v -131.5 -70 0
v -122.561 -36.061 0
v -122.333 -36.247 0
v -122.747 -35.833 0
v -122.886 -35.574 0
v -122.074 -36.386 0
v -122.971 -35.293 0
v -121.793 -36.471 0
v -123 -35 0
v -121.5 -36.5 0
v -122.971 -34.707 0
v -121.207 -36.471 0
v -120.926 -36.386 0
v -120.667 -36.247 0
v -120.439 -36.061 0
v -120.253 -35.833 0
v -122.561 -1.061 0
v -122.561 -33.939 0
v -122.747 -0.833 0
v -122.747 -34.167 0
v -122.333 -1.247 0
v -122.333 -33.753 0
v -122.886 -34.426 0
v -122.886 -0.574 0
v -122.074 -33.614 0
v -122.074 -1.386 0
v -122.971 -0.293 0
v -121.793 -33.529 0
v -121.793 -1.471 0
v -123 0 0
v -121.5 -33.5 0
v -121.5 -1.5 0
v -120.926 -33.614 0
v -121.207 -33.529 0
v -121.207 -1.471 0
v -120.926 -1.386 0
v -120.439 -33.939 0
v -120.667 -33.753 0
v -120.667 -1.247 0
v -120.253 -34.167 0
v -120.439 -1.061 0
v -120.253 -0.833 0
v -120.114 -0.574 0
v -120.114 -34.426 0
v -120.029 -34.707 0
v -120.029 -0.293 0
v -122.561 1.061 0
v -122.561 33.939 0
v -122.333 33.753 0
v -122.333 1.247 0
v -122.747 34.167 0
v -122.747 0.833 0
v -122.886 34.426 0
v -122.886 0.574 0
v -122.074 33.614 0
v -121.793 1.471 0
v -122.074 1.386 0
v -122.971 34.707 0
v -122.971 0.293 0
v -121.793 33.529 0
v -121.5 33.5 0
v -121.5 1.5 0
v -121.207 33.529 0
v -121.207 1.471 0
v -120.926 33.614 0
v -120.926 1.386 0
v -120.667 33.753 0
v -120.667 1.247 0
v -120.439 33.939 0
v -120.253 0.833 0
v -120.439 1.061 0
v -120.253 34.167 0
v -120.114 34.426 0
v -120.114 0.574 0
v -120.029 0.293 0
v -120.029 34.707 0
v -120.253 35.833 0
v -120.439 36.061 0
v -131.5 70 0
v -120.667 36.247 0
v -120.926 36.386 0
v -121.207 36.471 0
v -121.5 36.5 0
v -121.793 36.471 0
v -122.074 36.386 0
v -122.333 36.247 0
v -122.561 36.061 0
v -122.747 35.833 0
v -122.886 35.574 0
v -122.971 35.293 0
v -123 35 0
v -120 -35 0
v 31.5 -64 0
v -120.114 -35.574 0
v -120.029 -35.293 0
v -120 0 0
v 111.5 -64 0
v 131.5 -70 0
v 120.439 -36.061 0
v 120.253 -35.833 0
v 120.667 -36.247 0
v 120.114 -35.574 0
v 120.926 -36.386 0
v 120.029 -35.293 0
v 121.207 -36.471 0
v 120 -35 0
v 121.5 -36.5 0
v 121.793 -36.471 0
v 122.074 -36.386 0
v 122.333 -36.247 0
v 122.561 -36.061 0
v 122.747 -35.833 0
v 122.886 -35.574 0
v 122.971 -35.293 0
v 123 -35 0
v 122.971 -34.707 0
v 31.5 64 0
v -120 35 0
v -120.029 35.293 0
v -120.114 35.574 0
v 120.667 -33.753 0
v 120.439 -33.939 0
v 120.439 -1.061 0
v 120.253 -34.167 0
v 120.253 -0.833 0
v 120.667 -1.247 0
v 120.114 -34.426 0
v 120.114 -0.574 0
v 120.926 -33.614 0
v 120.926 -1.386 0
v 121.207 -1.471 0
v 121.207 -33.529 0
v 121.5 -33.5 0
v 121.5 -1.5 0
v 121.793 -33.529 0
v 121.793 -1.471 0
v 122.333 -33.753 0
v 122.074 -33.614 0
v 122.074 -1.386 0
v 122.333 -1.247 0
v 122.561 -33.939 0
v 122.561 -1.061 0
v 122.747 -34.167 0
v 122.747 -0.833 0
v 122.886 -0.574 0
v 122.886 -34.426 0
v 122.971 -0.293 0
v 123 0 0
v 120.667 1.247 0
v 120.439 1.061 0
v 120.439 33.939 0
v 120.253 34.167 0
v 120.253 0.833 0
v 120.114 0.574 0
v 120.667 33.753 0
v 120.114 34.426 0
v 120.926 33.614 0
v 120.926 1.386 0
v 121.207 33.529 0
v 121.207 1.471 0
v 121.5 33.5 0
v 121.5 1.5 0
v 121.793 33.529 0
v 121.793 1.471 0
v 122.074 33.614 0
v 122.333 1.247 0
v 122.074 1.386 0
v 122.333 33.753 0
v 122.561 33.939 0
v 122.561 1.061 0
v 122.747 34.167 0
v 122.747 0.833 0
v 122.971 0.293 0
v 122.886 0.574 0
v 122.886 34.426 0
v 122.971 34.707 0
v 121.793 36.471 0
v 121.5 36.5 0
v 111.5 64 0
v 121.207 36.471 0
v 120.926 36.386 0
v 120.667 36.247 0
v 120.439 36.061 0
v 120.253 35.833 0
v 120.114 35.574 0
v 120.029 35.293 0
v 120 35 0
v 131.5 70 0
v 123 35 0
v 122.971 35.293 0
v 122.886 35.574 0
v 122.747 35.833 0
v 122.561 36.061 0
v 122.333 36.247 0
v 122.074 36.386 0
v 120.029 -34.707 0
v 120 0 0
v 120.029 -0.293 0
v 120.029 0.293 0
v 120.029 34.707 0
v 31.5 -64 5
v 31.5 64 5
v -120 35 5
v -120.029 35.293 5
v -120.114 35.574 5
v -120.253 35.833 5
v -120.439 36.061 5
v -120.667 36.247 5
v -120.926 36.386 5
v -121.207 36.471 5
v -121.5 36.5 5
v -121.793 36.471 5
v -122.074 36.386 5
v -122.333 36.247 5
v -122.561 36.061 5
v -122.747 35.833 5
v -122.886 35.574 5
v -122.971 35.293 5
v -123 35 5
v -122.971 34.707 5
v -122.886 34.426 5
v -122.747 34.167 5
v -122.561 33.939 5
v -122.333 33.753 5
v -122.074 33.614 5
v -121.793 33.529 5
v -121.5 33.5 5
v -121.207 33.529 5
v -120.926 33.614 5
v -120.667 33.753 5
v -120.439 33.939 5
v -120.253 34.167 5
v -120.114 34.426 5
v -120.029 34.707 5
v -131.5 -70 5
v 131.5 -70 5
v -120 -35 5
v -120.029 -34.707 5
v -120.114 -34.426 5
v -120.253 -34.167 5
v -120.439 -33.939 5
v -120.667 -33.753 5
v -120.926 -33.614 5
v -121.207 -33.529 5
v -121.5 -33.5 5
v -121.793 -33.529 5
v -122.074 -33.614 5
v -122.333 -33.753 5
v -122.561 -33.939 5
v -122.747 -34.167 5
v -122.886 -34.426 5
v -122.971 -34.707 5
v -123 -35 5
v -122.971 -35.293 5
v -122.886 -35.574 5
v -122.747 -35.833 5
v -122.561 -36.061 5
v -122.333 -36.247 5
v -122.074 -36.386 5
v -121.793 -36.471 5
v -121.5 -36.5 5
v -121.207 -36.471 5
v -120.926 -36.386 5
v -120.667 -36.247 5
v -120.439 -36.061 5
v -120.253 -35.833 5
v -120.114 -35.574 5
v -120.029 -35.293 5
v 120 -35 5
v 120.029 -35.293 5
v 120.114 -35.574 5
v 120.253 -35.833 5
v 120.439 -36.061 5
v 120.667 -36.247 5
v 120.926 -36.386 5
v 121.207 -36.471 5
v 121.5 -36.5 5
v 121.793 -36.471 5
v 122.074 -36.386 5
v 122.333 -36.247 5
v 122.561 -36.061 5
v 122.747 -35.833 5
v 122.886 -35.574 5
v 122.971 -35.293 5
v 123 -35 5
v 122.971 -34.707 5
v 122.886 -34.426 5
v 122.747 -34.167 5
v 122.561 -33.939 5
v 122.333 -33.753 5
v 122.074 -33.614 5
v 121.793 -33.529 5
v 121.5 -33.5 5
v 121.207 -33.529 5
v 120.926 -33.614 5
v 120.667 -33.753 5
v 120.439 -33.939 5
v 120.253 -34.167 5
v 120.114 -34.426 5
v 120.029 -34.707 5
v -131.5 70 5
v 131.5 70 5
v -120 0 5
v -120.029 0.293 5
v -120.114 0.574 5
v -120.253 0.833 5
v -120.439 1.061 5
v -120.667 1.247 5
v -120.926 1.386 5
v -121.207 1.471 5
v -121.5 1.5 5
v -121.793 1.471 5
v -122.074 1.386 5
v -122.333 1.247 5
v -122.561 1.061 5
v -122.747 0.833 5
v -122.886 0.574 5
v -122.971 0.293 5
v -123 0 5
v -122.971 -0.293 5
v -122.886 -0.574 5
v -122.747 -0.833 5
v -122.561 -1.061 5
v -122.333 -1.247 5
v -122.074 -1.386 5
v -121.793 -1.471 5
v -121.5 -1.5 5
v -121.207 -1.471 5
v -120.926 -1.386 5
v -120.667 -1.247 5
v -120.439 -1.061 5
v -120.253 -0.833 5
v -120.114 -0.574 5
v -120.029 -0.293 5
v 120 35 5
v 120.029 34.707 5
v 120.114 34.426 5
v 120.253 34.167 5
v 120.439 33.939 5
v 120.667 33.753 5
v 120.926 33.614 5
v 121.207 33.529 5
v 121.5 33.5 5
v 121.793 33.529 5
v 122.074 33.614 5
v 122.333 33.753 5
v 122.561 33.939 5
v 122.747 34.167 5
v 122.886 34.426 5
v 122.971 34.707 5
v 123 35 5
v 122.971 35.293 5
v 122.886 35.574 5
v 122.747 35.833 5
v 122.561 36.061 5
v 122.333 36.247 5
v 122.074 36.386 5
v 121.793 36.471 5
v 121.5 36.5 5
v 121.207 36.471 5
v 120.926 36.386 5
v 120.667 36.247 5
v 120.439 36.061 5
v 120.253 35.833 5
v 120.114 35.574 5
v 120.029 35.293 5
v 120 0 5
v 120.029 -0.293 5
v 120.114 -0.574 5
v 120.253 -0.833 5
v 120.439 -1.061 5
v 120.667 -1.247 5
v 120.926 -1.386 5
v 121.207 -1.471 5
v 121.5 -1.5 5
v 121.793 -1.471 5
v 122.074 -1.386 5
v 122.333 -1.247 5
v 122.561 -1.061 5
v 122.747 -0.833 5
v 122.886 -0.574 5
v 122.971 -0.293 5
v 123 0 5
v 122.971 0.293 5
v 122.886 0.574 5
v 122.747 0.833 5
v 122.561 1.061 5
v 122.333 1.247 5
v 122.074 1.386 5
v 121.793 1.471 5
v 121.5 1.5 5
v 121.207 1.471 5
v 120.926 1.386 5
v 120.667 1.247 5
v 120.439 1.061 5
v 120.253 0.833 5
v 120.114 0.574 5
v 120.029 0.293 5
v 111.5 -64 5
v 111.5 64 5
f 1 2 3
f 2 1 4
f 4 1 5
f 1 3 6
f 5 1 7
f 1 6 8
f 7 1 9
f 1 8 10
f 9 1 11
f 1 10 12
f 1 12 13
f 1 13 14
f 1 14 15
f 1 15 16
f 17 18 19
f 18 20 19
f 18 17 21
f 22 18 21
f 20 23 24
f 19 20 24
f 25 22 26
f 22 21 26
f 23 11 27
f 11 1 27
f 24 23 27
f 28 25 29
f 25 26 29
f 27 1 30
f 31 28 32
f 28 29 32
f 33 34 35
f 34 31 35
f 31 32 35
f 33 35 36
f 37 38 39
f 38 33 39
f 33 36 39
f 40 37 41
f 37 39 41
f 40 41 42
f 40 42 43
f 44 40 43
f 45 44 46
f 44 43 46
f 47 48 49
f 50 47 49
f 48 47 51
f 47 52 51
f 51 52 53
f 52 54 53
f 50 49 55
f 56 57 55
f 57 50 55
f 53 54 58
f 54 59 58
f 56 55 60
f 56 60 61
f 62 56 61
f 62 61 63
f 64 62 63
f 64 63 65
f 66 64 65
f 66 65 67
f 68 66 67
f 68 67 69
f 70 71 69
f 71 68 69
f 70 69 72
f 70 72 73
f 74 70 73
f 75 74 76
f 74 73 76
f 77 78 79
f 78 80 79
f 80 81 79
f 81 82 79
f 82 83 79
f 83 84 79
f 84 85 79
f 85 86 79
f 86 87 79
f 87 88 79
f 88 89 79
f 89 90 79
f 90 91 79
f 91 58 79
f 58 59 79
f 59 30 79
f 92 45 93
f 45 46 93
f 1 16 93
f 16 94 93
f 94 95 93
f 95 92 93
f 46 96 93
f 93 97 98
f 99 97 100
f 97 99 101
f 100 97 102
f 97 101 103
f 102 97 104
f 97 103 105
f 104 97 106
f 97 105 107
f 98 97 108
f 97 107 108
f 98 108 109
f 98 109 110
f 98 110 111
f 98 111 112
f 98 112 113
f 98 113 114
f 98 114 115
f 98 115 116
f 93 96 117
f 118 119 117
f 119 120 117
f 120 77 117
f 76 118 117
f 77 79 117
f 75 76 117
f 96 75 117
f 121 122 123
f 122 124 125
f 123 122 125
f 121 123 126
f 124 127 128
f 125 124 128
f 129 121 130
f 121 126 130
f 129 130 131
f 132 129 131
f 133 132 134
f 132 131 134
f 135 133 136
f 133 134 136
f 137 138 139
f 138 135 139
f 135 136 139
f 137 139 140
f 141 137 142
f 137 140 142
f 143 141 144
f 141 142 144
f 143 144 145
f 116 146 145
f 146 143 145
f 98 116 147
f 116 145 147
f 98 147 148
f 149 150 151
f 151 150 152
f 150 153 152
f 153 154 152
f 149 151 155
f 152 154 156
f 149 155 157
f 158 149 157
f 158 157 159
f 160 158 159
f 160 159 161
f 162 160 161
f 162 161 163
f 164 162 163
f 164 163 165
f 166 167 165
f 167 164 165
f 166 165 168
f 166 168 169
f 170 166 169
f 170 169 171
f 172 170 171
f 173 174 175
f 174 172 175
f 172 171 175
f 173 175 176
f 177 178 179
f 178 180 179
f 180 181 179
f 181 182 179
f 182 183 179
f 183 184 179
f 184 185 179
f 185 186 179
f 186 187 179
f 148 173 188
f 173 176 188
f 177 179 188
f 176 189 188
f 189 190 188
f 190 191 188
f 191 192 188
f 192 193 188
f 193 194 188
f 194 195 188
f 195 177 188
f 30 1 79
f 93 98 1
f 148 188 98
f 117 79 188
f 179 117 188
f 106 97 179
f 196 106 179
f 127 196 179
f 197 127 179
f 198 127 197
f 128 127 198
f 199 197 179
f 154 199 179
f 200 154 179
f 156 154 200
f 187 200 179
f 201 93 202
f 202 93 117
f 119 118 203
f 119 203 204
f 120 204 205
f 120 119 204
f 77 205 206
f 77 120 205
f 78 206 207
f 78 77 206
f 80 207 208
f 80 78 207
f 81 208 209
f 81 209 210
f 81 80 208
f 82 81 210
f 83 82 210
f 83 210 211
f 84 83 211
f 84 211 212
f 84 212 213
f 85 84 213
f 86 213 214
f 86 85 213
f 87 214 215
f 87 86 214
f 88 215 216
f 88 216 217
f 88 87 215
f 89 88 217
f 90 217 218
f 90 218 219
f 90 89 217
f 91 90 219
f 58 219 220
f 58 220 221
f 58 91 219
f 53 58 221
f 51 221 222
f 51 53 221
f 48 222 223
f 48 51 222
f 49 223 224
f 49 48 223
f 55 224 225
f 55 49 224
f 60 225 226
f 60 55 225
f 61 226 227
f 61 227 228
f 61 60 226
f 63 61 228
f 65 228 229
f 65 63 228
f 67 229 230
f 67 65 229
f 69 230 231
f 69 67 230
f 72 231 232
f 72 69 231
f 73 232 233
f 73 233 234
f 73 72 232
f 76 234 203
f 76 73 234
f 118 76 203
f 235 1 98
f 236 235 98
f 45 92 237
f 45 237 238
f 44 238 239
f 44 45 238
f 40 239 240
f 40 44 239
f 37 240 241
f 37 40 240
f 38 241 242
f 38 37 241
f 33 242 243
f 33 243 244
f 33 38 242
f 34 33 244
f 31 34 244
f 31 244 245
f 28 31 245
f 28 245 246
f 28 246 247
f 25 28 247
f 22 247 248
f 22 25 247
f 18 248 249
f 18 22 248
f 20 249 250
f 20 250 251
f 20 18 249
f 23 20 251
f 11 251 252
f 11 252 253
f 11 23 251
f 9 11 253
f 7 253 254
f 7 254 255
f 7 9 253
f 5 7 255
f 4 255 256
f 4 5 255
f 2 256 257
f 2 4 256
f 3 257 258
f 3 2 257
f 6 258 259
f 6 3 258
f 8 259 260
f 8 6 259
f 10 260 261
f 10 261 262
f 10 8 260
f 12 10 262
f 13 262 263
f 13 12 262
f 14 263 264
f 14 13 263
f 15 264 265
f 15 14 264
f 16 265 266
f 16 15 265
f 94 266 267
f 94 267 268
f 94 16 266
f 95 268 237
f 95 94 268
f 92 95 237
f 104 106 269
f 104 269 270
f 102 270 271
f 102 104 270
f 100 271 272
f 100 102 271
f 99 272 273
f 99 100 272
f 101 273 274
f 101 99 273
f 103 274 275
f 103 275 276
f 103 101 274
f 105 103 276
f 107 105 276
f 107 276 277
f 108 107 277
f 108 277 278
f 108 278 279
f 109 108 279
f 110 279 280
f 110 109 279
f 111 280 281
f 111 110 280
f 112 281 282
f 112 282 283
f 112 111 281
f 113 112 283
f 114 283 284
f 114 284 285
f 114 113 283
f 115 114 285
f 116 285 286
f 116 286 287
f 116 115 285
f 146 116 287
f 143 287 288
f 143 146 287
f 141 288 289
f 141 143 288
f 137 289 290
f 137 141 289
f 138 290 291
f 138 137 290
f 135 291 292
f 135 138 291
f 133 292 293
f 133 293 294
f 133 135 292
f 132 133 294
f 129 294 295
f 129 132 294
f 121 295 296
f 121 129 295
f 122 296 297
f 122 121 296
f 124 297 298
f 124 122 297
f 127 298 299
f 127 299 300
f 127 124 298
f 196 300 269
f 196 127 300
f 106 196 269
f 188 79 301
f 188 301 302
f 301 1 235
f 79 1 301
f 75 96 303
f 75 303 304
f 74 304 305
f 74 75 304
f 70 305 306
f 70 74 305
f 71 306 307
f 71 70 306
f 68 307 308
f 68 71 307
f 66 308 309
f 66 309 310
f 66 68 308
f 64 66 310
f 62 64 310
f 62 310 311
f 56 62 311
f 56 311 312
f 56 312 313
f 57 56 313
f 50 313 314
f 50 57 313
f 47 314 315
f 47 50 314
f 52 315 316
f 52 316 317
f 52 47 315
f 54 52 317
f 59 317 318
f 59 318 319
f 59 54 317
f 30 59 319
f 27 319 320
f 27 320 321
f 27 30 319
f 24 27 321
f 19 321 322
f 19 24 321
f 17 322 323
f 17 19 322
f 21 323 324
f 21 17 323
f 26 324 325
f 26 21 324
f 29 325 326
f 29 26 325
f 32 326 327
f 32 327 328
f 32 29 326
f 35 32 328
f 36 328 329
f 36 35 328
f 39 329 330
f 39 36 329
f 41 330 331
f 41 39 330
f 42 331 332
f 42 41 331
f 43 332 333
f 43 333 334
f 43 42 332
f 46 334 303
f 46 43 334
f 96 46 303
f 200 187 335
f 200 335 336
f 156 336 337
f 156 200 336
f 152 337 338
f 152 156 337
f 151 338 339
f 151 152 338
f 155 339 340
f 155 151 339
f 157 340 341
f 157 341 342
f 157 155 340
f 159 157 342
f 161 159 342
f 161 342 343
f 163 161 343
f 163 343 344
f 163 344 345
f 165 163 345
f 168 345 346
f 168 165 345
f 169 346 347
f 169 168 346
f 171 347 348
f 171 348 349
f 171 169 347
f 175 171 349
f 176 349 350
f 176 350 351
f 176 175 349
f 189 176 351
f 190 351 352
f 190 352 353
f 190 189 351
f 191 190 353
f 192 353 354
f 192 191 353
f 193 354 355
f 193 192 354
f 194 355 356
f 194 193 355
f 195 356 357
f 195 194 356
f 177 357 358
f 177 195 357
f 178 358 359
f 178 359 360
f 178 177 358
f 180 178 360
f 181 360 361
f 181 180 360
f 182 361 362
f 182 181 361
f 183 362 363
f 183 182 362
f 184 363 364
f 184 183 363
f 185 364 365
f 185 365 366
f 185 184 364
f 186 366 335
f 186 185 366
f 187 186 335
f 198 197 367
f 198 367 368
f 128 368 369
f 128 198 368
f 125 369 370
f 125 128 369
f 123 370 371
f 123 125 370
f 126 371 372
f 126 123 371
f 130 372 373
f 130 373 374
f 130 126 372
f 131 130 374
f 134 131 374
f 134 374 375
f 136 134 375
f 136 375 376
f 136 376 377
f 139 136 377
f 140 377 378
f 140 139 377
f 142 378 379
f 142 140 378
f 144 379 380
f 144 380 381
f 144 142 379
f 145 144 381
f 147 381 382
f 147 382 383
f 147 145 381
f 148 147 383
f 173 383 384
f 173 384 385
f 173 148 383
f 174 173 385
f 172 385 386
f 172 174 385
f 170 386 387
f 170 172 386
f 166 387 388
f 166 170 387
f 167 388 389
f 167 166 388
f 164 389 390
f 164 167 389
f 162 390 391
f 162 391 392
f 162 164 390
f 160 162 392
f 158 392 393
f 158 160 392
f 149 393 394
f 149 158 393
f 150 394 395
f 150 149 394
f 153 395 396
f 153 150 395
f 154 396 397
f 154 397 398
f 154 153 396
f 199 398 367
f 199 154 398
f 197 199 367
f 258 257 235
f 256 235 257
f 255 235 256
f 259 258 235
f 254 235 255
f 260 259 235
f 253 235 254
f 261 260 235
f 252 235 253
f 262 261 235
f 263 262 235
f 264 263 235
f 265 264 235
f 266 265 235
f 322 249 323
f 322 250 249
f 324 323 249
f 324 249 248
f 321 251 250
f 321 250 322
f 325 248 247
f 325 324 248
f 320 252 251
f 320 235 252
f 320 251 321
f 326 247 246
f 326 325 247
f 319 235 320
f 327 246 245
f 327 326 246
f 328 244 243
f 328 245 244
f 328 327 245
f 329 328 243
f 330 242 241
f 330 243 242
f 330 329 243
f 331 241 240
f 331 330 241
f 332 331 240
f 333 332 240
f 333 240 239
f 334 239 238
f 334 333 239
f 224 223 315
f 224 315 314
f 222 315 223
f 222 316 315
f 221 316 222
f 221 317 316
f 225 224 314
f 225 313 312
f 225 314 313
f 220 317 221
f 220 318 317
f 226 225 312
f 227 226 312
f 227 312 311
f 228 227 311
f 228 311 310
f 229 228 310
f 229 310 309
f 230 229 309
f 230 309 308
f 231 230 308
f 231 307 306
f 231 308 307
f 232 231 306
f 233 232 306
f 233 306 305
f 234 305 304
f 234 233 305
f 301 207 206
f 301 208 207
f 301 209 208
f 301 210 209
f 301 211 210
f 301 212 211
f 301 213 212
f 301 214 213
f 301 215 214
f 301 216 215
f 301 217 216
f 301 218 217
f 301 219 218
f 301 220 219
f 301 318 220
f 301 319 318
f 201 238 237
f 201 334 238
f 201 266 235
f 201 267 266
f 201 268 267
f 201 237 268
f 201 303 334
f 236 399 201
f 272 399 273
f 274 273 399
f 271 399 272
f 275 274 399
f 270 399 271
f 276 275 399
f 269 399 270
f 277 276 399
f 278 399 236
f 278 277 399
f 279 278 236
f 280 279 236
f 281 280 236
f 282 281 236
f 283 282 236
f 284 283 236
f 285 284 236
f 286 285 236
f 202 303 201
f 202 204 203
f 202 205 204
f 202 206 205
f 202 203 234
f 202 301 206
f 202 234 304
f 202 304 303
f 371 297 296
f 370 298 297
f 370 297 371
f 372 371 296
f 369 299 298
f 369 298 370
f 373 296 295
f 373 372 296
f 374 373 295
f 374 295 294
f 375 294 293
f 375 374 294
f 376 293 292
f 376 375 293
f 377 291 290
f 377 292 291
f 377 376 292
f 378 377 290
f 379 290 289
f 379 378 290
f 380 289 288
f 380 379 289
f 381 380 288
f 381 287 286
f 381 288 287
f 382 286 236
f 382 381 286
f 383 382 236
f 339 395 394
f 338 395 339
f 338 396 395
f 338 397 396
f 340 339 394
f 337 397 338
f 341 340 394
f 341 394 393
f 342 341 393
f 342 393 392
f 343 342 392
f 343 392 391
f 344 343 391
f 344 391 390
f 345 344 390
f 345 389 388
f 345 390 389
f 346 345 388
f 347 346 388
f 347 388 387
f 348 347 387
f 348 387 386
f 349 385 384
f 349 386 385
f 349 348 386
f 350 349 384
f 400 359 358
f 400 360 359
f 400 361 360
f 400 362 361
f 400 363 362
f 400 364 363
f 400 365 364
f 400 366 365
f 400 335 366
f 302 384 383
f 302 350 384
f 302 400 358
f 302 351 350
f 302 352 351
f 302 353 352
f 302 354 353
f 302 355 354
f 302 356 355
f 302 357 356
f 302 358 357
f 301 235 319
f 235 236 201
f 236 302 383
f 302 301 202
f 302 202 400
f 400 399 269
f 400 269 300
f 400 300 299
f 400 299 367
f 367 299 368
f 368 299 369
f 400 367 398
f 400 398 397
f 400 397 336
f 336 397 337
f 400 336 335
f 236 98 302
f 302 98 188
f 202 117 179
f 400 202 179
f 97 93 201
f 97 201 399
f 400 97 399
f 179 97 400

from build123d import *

# Parameters (mm, degrees)
SKETCH_1_W      = 263
SKETCH_1_H      = 140
SKETCH_1_R      = 1.5
SKETCH_1_W_2    = 80
SKETCH_1_H_2    = 128
EXTRUDE_1_DEPTH = 5


with BuildPart() as part:
    # 草图1 → 凸台-拉伸1 (new body)
    with BuildSketch(Plane.XY):
        Rectangle(SKETCH_1_W, SKETCH_1_H)
        with Locations((-121.5, 35)):
            Circle(SKETCH_1_R, mode=Mode.SUBTRACT)
        with Locations((-121.5, 0)):
            Circle(SKETCH_1_R, mode=Mode.SUBTRACT)
        with Locations((-121.5, -35)):
            Circle(SKETCH_1_R, mode=Mode.SUBTRACT)
        with Locations(Location((121.5, -35, 0), (0, 0, 180))):
            Circle(SKETCH_1_R, mode=Mode.SUBTRACT)
        with Locations(Location((121.5, 0, 0), (0, 0, 180))):
            Circle(SKETCH_1_R, mode=Mode.SUBTRACT)
        with Locations(Location((121.5, 35, 0), (0, 0, 180))):
            Circle(SKETCH_1_R, mode=Mode.SUBTRACT)
        with Locations((71.5, 0)):
            Rectangle(SKETCH_1_W_2, SKETCH_1_H_2, mode=Mode.SUBTRACT)
    extrude(amount=EXTRUDE_1_DEPTH)


solid = part.part
